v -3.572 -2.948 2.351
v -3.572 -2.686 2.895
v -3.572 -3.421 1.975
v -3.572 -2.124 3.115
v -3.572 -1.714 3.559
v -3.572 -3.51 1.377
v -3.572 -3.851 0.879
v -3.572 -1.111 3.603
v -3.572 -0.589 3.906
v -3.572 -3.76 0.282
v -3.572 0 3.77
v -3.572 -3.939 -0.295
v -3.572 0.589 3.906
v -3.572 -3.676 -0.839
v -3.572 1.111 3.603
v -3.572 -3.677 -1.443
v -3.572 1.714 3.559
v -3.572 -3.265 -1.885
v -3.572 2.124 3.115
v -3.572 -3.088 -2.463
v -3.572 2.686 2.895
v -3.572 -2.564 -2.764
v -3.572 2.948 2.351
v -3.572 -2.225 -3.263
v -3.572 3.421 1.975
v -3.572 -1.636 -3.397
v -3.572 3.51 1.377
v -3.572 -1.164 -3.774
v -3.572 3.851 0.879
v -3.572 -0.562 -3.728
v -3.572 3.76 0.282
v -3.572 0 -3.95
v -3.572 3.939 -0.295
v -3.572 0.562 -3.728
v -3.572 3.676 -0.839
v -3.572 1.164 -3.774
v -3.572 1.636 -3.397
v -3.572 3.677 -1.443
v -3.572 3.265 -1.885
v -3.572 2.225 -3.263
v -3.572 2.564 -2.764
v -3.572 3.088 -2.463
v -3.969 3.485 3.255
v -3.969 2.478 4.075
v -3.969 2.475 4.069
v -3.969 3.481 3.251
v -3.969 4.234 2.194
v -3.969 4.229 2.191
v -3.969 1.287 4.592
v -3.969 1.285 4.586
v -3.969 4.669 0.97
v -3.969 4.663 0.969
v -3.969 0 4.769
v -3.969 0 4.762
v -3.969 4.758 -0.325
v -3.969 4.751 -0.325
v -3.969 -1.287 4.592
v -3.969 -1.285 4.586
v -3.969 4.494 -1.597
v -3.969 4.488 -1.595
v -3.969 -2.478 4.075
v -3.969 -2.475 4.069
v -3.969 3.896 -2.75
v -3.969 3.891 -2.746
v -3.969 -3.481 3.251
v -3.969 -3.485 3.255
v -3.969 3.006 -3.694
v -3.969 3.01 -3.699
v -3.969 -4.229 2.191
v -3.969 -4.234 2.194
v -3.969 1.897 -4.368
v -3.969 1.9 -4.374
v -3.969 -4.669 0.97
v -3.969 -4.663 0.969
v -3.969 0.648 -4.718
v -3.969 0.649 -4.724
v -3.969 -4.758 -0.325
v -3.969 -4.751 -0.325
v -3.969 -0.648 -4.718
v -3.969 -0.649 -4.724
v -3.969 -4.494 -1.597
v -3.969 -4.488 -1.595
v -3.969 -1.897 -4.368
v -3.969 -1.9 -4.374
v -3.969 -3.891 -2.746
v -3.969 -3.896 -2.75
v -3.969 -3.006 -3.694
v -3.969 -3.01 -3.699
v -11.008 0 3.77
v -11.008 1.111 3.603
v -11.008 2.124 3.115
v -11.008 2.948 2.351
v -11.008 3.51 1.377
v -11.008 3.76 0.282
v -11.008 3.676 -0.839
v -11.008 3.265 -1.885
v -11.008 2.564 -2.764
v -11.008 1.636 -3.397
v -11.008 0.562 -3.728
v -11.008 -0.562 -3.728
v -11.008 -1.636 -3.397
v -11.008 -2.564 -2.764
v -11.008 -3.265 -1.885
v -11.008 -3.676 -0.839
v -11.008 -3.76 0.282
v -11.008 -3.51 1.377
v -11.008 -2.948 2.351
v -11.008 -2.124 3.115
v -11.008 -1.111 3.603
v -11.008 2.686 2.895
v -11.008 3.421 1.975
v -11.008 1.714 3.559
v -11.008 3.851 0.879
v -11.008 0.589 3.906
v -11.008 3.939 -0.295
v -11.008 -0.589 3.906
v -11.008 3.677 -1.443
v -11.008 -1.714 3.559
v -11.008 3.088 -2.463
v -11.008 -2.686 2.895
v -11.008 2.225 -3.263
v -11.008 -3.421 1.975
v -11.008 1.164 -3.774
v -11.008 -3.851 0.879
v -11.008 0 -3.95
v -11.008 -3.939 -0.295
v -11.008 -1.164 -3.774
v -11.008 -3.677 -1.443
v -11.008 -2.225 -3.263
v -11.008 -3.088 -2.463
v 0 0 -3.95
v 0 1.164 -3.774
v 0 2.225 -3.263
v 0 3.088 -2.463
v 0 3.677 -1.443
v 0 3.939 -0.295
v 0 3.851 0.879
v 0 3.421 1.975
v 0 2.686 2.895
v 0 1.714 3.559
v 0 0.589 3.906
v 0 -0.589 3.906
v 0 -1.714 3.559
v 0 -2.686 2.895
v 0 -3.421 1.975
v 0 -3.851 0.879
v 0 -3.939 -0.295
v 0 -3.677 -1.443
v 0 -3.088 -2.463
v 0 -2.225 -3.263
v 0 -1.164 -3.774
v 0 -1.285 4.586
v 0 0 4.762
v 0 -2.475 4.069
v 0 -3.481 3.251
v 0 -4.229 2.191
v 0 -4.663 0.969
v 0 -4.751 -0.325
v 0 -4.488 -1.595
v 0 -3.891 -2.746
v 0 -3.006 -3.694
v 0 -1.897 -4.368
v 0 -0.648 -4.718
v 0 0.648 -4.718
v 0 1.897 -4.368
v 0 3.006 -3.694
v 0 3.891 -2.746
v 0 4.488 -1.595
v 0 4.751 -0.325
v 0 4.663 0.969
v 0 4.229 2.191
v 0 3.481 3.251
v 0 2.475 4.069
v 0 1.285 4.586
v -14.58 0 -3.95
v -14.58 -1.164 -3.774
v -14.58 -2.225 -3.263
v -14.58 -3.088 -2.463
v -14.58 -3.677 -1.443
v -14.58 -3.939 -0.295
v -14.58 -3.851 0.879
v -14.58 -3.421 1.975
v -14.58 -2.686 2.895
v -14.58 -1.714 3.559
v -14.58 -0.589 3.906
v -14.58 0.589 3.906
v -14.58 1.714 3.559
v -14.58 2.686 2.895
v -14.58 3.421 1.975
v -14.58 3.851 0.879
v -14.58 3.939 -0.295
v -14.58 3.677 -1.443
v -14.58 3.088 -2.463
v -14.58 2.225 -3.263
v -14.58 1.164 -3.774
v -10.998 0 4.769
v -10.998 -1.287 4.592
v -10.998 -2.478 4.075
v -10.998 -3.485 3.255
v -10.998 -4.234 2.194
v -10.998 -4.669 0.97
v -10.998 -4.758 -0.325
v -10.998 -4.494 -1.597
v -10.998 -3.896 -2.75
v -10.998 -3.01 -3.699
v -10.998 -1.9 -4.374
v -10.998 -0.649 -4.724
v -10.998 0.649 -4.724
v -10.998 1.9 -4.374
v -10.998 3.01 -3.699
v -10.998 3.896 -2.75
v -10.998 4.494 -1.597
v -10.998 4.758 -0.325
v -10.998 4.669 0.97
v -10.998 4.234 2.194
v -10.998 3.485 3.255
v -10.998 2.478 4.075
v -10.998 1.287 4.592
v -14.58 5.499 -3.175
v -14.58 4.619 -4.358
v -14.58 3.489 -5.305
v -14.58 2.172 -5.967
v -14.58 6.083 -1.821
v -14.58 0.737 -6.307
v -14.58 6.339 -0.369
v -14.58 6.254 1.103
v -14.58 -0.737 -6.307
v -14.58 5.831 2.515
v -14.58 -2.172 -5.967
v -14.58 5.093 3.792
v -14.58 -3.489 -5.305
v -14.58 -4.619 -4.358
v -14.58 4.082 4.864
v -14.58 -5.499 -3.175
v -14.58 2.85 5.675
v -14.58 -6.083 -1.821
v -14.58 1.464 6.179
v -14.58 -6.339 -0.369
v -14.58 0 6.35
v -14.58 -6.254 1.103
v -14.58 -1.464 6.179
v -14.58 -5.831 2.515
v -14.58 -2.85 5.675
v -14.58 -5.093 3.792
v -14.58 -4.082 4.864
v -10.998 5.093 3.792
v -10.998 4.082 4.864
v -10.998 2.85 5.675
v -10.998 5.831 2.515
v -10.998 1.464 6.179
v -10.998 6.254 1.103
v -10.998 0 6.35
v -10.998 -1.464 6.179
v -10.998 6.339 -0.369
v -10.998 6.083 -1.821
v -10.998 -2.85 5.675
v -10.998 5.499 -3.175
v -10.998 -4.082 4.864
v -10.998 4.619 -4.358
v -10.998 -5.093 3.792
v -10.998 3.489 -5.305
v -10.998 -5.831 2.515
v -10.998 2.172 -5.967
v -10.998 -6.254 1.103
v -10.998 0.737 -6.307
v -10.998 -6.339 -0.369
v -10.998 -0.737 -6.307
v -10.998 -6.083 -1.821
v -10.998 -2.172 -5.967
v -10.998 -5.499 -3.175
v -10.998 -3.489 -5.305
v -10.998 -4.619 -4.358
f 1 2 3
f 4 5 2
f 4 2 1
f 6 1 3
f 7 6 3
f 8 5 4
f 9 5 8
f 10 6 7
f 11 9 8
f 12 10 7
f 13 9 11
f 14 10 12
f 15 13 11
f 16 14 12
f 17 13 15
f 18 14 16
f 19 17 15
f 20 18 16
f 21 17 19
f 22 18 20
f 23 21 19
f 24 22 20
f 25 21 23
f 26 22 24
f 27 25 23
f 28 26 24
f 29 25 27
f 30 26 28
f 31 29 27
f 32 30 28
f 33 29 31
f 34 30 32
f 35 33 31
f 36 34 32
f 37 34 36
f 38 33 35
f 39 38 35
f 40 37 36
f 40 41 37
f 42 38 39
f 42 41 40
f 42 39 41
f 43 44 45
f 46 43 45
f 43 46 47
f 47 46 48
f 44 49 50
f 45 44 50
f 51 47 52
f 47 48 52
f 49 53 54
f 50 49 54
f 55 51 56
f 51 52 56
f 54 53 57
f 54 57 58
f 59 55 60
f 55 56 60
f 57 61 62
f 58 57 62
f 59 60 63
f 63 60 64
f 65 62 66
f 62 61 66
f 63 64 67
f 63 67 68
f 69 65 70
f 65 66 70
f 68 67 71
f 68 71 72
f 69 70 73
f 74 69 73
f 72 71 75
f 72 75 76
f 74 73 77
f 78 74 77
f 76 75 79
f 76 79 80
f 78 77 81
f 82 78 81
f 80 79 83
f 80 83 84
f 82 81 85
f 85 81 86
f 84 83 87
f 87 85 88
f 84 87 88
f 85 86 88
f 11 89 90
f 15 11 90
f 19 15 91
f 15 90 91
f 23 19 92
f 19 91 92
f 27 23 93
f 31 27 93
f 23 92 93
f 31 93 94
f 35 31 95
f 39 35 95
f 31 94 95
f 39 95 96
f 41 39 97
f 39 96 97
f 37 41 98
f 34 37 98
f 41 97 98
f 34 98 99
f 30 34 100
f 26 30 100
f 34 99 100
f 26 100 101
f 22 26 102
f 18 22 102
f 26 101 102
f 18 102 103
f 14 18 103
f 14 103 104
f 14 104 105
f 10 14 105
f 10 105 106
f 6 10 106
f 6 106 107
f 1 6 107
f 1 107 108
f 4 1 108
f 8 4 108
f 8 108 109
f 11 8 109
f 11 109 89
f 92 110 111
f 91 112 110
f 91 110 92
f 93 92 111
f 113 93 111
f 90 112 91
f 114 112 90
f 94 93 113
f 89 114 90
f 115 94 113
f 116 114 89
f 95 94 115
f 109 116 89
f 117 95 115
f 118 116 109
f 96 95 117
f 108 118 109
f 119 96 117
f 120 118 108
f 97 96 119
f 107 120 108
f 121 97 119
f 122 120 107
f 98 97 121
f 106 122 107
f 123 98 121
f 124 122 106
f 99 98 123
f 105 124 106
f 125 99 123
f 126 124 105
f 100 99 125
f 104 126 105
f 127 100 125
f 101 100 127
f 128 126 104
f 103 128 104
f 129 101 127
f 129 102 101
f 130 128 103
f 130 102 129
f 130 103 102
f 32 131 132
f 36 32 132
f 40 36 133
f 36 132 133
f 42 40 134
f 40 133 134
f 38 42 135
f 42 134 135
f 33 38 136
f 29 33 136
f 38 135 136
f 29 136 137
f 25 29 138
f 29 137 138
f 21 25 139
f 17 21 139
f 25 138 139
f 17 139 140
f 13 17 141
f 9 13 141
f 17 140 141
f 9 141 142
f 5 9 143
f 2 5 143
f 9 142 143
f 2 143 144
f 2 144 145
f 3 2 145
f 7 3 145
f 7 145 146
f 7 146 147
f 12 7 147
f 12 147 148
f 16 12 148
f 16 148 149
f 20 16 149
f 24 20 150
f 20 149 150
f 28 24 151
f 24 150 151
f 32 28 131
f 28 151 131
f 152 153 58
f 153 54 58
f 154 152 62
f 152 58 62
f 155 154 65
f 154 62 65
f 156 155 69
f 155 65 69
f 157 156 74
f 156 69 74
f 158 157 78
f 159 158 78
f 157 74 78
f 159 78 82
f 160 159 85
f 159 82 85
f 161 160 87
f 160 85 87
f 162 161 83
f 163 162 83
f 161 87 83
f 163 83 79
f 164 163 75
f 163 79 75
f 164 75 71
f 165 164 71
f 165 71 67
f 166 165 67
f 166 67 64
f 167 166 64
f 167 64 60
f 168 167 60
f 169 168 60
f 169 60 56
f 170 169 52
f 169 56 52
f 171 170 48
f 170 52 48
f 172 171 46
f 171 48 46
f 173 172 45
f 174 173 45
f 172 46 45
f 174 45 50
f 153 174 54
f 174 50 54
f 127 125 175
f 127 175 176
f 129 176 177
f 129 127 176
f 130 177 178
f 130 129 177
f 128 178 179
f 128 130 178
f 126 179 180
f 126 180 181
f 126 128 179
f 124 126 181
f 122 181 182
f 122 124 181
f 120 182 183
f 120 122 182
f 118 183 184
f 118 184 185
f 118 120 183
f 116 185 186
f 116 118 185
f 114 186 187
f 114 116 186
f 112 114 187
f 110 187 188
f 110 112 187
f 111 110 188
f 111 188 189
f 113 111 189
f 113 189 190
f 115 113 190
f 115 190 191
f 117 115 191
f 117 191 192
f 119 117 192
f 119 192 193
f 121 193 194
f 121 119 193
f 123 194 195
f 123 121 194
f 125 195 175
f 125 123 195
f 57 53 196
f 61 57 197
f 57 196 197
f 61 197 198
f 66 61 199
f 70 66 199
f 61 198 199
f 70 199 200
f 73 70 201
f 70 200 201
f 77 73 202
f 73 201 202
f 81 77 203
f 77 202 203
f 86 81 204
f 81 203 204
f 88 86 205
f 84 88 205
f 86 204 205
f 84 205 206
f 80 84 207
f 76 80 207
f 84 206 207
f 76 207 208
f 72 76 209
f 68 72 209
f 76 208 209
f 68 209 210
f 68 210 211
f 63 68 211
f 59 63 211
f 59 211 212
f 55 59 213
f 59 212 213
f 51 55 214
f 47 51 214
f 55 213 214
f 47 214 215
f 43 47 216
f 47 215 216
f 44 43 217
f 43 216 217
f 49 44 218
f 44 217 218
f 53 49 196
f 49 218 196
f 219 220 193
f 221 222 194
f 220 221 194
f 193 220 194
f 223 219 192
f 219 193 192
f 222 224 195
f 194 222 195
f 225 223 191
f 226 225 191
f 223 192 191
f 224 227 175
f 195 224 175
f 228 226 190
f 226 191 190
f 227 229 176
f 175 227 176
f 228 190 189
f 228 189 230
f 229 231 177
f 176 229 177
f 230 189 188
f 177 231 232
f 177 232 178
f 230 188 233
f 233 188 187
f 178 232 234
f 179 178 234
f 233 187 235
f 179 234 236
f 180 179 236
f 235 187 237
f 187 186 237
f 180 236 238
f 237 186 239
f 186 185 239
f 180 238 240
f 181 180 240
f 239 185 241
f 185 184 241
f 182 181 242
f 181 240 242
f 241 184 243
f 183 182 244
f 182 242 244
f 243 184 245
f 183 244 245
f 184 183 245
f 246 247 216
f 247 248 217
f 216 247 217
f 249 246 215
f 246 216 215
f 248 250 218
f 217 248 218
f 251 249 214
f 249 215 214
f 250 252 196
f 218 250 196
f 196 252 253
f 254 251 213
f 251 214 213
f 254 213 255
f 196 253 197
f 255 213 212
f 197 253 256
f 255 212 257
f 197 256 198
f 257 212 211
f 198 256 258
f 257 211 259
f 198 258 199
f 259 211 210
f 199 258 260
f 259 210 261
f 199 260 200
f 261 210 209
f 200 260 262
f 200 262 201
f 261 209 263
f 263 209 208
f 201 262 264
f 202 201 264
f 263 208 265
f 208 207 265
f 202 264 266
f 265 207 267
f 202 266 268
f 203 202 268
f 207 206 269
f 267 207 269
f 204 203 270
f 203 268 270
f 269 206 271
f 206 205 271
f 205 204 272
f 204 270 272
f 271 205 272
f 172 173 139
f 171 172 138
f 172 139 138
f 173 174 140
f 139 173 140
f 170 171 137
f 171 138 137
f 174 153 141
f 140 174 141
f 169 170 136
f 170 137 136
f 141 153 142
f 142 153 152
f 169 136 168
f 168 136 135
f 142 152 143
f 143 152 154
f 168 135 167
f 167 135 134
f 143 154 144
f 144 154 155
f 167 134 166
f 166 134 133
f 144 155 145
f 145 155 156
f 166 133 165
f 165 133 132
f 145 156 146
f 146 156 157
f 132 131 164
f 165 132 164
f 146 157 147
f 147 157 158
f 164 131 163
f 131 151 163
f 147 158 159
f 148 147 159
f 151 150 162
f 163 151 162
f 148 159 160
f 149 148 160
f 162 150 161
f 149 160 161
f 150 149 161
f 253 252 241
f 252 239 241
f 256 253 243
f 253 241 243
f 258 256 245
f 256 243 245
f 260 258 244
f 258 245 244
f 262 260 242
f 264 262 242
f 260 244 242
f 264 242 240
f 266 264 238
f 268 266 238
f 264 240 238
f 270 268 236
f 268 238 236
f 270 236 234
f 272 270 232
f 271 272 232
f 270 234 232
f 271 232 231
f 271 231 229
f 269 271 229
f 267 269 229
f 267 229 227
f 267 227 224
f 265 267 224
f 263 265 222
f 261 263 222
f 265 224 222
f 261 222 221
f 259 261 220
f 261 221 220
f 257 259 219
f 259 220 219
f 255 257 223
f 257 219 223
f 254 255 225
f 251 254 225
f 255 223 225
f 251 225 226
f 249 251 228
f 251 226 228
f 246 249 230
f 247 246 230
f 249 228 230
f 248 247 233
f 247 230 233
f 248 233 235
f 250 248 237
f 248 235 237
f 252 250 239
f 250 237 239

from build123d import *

# Parameters (mm, degrees)
SKETCH2_R          = 3.9497
CUT_EXTRUDE1_DEPTH = 3.571875
SKETCH3_R          = 3.7703125
CUT_EXTRUDE2_DEPTH = 18.123368131
CUT_EXTRUDE3_START = -3.571875
SKETCH4_R          = 3.9497
CUT_EXTRUDE3_DEPTH = 3.571875


with BuildPart() as part:
    # Sketch1 → Revolve1 (revolve)
    with BuildSketch(Plane.XY, mode=Mode.PRIVATE) as revolve1_sk:
        Polygon((0, 0), (0, 4.7625), (-3.96875, 4.7625), (-3.96875, 4.76885), (-10.9982, 4.76885), (-10.9982, 6.35), (-14.5796, 6.35), (-14.5796, 0), align=None)
    revolve(revolve1_sk.sketch.rotate(Axis((-14.5796, 0, 0), (1, 0, 0)), 90), axis=Axis((-14.5796, 0, 0), (1, 0, 0)))

    # Sketch2 → Cut-Extrude1 (cut)
    with BuildSketch(Plane(origin=(0, 0, 0), x_dir=(0, 0, -1), z_dir=(1, 0, 0))):
        Circle(SKETCH2_R)
    extrude(amount=-CUT_EXTRUDE1_DEPTH, mode=Mode.SUBTRACT)

    # Sketch3 → Cut-Extrude2 (cut, through all)
    with BuildSketch(Plane.ZY.offset(14.5796)):
        Circle(SKETCH3_R)
    extrude(amount=-CUT_EXTRUDE2_DEPTH, mode=Mode.SUBTRACT)

    # Sketch4 → Cut-Extrude3 (cut)
    with BuildSketch(Plane.ZY.offset(14.5796).offset(CUT_EXTRUDE3_START)):
        with Locations(Location((0, 0, 0), (0, 0, 180))):
            Circle(SKETCH4_R)
    extrude(amount=CUT_EXTRUDE3_DEPTH, mode=Mode.SUBTRACT)


solid = part.part
